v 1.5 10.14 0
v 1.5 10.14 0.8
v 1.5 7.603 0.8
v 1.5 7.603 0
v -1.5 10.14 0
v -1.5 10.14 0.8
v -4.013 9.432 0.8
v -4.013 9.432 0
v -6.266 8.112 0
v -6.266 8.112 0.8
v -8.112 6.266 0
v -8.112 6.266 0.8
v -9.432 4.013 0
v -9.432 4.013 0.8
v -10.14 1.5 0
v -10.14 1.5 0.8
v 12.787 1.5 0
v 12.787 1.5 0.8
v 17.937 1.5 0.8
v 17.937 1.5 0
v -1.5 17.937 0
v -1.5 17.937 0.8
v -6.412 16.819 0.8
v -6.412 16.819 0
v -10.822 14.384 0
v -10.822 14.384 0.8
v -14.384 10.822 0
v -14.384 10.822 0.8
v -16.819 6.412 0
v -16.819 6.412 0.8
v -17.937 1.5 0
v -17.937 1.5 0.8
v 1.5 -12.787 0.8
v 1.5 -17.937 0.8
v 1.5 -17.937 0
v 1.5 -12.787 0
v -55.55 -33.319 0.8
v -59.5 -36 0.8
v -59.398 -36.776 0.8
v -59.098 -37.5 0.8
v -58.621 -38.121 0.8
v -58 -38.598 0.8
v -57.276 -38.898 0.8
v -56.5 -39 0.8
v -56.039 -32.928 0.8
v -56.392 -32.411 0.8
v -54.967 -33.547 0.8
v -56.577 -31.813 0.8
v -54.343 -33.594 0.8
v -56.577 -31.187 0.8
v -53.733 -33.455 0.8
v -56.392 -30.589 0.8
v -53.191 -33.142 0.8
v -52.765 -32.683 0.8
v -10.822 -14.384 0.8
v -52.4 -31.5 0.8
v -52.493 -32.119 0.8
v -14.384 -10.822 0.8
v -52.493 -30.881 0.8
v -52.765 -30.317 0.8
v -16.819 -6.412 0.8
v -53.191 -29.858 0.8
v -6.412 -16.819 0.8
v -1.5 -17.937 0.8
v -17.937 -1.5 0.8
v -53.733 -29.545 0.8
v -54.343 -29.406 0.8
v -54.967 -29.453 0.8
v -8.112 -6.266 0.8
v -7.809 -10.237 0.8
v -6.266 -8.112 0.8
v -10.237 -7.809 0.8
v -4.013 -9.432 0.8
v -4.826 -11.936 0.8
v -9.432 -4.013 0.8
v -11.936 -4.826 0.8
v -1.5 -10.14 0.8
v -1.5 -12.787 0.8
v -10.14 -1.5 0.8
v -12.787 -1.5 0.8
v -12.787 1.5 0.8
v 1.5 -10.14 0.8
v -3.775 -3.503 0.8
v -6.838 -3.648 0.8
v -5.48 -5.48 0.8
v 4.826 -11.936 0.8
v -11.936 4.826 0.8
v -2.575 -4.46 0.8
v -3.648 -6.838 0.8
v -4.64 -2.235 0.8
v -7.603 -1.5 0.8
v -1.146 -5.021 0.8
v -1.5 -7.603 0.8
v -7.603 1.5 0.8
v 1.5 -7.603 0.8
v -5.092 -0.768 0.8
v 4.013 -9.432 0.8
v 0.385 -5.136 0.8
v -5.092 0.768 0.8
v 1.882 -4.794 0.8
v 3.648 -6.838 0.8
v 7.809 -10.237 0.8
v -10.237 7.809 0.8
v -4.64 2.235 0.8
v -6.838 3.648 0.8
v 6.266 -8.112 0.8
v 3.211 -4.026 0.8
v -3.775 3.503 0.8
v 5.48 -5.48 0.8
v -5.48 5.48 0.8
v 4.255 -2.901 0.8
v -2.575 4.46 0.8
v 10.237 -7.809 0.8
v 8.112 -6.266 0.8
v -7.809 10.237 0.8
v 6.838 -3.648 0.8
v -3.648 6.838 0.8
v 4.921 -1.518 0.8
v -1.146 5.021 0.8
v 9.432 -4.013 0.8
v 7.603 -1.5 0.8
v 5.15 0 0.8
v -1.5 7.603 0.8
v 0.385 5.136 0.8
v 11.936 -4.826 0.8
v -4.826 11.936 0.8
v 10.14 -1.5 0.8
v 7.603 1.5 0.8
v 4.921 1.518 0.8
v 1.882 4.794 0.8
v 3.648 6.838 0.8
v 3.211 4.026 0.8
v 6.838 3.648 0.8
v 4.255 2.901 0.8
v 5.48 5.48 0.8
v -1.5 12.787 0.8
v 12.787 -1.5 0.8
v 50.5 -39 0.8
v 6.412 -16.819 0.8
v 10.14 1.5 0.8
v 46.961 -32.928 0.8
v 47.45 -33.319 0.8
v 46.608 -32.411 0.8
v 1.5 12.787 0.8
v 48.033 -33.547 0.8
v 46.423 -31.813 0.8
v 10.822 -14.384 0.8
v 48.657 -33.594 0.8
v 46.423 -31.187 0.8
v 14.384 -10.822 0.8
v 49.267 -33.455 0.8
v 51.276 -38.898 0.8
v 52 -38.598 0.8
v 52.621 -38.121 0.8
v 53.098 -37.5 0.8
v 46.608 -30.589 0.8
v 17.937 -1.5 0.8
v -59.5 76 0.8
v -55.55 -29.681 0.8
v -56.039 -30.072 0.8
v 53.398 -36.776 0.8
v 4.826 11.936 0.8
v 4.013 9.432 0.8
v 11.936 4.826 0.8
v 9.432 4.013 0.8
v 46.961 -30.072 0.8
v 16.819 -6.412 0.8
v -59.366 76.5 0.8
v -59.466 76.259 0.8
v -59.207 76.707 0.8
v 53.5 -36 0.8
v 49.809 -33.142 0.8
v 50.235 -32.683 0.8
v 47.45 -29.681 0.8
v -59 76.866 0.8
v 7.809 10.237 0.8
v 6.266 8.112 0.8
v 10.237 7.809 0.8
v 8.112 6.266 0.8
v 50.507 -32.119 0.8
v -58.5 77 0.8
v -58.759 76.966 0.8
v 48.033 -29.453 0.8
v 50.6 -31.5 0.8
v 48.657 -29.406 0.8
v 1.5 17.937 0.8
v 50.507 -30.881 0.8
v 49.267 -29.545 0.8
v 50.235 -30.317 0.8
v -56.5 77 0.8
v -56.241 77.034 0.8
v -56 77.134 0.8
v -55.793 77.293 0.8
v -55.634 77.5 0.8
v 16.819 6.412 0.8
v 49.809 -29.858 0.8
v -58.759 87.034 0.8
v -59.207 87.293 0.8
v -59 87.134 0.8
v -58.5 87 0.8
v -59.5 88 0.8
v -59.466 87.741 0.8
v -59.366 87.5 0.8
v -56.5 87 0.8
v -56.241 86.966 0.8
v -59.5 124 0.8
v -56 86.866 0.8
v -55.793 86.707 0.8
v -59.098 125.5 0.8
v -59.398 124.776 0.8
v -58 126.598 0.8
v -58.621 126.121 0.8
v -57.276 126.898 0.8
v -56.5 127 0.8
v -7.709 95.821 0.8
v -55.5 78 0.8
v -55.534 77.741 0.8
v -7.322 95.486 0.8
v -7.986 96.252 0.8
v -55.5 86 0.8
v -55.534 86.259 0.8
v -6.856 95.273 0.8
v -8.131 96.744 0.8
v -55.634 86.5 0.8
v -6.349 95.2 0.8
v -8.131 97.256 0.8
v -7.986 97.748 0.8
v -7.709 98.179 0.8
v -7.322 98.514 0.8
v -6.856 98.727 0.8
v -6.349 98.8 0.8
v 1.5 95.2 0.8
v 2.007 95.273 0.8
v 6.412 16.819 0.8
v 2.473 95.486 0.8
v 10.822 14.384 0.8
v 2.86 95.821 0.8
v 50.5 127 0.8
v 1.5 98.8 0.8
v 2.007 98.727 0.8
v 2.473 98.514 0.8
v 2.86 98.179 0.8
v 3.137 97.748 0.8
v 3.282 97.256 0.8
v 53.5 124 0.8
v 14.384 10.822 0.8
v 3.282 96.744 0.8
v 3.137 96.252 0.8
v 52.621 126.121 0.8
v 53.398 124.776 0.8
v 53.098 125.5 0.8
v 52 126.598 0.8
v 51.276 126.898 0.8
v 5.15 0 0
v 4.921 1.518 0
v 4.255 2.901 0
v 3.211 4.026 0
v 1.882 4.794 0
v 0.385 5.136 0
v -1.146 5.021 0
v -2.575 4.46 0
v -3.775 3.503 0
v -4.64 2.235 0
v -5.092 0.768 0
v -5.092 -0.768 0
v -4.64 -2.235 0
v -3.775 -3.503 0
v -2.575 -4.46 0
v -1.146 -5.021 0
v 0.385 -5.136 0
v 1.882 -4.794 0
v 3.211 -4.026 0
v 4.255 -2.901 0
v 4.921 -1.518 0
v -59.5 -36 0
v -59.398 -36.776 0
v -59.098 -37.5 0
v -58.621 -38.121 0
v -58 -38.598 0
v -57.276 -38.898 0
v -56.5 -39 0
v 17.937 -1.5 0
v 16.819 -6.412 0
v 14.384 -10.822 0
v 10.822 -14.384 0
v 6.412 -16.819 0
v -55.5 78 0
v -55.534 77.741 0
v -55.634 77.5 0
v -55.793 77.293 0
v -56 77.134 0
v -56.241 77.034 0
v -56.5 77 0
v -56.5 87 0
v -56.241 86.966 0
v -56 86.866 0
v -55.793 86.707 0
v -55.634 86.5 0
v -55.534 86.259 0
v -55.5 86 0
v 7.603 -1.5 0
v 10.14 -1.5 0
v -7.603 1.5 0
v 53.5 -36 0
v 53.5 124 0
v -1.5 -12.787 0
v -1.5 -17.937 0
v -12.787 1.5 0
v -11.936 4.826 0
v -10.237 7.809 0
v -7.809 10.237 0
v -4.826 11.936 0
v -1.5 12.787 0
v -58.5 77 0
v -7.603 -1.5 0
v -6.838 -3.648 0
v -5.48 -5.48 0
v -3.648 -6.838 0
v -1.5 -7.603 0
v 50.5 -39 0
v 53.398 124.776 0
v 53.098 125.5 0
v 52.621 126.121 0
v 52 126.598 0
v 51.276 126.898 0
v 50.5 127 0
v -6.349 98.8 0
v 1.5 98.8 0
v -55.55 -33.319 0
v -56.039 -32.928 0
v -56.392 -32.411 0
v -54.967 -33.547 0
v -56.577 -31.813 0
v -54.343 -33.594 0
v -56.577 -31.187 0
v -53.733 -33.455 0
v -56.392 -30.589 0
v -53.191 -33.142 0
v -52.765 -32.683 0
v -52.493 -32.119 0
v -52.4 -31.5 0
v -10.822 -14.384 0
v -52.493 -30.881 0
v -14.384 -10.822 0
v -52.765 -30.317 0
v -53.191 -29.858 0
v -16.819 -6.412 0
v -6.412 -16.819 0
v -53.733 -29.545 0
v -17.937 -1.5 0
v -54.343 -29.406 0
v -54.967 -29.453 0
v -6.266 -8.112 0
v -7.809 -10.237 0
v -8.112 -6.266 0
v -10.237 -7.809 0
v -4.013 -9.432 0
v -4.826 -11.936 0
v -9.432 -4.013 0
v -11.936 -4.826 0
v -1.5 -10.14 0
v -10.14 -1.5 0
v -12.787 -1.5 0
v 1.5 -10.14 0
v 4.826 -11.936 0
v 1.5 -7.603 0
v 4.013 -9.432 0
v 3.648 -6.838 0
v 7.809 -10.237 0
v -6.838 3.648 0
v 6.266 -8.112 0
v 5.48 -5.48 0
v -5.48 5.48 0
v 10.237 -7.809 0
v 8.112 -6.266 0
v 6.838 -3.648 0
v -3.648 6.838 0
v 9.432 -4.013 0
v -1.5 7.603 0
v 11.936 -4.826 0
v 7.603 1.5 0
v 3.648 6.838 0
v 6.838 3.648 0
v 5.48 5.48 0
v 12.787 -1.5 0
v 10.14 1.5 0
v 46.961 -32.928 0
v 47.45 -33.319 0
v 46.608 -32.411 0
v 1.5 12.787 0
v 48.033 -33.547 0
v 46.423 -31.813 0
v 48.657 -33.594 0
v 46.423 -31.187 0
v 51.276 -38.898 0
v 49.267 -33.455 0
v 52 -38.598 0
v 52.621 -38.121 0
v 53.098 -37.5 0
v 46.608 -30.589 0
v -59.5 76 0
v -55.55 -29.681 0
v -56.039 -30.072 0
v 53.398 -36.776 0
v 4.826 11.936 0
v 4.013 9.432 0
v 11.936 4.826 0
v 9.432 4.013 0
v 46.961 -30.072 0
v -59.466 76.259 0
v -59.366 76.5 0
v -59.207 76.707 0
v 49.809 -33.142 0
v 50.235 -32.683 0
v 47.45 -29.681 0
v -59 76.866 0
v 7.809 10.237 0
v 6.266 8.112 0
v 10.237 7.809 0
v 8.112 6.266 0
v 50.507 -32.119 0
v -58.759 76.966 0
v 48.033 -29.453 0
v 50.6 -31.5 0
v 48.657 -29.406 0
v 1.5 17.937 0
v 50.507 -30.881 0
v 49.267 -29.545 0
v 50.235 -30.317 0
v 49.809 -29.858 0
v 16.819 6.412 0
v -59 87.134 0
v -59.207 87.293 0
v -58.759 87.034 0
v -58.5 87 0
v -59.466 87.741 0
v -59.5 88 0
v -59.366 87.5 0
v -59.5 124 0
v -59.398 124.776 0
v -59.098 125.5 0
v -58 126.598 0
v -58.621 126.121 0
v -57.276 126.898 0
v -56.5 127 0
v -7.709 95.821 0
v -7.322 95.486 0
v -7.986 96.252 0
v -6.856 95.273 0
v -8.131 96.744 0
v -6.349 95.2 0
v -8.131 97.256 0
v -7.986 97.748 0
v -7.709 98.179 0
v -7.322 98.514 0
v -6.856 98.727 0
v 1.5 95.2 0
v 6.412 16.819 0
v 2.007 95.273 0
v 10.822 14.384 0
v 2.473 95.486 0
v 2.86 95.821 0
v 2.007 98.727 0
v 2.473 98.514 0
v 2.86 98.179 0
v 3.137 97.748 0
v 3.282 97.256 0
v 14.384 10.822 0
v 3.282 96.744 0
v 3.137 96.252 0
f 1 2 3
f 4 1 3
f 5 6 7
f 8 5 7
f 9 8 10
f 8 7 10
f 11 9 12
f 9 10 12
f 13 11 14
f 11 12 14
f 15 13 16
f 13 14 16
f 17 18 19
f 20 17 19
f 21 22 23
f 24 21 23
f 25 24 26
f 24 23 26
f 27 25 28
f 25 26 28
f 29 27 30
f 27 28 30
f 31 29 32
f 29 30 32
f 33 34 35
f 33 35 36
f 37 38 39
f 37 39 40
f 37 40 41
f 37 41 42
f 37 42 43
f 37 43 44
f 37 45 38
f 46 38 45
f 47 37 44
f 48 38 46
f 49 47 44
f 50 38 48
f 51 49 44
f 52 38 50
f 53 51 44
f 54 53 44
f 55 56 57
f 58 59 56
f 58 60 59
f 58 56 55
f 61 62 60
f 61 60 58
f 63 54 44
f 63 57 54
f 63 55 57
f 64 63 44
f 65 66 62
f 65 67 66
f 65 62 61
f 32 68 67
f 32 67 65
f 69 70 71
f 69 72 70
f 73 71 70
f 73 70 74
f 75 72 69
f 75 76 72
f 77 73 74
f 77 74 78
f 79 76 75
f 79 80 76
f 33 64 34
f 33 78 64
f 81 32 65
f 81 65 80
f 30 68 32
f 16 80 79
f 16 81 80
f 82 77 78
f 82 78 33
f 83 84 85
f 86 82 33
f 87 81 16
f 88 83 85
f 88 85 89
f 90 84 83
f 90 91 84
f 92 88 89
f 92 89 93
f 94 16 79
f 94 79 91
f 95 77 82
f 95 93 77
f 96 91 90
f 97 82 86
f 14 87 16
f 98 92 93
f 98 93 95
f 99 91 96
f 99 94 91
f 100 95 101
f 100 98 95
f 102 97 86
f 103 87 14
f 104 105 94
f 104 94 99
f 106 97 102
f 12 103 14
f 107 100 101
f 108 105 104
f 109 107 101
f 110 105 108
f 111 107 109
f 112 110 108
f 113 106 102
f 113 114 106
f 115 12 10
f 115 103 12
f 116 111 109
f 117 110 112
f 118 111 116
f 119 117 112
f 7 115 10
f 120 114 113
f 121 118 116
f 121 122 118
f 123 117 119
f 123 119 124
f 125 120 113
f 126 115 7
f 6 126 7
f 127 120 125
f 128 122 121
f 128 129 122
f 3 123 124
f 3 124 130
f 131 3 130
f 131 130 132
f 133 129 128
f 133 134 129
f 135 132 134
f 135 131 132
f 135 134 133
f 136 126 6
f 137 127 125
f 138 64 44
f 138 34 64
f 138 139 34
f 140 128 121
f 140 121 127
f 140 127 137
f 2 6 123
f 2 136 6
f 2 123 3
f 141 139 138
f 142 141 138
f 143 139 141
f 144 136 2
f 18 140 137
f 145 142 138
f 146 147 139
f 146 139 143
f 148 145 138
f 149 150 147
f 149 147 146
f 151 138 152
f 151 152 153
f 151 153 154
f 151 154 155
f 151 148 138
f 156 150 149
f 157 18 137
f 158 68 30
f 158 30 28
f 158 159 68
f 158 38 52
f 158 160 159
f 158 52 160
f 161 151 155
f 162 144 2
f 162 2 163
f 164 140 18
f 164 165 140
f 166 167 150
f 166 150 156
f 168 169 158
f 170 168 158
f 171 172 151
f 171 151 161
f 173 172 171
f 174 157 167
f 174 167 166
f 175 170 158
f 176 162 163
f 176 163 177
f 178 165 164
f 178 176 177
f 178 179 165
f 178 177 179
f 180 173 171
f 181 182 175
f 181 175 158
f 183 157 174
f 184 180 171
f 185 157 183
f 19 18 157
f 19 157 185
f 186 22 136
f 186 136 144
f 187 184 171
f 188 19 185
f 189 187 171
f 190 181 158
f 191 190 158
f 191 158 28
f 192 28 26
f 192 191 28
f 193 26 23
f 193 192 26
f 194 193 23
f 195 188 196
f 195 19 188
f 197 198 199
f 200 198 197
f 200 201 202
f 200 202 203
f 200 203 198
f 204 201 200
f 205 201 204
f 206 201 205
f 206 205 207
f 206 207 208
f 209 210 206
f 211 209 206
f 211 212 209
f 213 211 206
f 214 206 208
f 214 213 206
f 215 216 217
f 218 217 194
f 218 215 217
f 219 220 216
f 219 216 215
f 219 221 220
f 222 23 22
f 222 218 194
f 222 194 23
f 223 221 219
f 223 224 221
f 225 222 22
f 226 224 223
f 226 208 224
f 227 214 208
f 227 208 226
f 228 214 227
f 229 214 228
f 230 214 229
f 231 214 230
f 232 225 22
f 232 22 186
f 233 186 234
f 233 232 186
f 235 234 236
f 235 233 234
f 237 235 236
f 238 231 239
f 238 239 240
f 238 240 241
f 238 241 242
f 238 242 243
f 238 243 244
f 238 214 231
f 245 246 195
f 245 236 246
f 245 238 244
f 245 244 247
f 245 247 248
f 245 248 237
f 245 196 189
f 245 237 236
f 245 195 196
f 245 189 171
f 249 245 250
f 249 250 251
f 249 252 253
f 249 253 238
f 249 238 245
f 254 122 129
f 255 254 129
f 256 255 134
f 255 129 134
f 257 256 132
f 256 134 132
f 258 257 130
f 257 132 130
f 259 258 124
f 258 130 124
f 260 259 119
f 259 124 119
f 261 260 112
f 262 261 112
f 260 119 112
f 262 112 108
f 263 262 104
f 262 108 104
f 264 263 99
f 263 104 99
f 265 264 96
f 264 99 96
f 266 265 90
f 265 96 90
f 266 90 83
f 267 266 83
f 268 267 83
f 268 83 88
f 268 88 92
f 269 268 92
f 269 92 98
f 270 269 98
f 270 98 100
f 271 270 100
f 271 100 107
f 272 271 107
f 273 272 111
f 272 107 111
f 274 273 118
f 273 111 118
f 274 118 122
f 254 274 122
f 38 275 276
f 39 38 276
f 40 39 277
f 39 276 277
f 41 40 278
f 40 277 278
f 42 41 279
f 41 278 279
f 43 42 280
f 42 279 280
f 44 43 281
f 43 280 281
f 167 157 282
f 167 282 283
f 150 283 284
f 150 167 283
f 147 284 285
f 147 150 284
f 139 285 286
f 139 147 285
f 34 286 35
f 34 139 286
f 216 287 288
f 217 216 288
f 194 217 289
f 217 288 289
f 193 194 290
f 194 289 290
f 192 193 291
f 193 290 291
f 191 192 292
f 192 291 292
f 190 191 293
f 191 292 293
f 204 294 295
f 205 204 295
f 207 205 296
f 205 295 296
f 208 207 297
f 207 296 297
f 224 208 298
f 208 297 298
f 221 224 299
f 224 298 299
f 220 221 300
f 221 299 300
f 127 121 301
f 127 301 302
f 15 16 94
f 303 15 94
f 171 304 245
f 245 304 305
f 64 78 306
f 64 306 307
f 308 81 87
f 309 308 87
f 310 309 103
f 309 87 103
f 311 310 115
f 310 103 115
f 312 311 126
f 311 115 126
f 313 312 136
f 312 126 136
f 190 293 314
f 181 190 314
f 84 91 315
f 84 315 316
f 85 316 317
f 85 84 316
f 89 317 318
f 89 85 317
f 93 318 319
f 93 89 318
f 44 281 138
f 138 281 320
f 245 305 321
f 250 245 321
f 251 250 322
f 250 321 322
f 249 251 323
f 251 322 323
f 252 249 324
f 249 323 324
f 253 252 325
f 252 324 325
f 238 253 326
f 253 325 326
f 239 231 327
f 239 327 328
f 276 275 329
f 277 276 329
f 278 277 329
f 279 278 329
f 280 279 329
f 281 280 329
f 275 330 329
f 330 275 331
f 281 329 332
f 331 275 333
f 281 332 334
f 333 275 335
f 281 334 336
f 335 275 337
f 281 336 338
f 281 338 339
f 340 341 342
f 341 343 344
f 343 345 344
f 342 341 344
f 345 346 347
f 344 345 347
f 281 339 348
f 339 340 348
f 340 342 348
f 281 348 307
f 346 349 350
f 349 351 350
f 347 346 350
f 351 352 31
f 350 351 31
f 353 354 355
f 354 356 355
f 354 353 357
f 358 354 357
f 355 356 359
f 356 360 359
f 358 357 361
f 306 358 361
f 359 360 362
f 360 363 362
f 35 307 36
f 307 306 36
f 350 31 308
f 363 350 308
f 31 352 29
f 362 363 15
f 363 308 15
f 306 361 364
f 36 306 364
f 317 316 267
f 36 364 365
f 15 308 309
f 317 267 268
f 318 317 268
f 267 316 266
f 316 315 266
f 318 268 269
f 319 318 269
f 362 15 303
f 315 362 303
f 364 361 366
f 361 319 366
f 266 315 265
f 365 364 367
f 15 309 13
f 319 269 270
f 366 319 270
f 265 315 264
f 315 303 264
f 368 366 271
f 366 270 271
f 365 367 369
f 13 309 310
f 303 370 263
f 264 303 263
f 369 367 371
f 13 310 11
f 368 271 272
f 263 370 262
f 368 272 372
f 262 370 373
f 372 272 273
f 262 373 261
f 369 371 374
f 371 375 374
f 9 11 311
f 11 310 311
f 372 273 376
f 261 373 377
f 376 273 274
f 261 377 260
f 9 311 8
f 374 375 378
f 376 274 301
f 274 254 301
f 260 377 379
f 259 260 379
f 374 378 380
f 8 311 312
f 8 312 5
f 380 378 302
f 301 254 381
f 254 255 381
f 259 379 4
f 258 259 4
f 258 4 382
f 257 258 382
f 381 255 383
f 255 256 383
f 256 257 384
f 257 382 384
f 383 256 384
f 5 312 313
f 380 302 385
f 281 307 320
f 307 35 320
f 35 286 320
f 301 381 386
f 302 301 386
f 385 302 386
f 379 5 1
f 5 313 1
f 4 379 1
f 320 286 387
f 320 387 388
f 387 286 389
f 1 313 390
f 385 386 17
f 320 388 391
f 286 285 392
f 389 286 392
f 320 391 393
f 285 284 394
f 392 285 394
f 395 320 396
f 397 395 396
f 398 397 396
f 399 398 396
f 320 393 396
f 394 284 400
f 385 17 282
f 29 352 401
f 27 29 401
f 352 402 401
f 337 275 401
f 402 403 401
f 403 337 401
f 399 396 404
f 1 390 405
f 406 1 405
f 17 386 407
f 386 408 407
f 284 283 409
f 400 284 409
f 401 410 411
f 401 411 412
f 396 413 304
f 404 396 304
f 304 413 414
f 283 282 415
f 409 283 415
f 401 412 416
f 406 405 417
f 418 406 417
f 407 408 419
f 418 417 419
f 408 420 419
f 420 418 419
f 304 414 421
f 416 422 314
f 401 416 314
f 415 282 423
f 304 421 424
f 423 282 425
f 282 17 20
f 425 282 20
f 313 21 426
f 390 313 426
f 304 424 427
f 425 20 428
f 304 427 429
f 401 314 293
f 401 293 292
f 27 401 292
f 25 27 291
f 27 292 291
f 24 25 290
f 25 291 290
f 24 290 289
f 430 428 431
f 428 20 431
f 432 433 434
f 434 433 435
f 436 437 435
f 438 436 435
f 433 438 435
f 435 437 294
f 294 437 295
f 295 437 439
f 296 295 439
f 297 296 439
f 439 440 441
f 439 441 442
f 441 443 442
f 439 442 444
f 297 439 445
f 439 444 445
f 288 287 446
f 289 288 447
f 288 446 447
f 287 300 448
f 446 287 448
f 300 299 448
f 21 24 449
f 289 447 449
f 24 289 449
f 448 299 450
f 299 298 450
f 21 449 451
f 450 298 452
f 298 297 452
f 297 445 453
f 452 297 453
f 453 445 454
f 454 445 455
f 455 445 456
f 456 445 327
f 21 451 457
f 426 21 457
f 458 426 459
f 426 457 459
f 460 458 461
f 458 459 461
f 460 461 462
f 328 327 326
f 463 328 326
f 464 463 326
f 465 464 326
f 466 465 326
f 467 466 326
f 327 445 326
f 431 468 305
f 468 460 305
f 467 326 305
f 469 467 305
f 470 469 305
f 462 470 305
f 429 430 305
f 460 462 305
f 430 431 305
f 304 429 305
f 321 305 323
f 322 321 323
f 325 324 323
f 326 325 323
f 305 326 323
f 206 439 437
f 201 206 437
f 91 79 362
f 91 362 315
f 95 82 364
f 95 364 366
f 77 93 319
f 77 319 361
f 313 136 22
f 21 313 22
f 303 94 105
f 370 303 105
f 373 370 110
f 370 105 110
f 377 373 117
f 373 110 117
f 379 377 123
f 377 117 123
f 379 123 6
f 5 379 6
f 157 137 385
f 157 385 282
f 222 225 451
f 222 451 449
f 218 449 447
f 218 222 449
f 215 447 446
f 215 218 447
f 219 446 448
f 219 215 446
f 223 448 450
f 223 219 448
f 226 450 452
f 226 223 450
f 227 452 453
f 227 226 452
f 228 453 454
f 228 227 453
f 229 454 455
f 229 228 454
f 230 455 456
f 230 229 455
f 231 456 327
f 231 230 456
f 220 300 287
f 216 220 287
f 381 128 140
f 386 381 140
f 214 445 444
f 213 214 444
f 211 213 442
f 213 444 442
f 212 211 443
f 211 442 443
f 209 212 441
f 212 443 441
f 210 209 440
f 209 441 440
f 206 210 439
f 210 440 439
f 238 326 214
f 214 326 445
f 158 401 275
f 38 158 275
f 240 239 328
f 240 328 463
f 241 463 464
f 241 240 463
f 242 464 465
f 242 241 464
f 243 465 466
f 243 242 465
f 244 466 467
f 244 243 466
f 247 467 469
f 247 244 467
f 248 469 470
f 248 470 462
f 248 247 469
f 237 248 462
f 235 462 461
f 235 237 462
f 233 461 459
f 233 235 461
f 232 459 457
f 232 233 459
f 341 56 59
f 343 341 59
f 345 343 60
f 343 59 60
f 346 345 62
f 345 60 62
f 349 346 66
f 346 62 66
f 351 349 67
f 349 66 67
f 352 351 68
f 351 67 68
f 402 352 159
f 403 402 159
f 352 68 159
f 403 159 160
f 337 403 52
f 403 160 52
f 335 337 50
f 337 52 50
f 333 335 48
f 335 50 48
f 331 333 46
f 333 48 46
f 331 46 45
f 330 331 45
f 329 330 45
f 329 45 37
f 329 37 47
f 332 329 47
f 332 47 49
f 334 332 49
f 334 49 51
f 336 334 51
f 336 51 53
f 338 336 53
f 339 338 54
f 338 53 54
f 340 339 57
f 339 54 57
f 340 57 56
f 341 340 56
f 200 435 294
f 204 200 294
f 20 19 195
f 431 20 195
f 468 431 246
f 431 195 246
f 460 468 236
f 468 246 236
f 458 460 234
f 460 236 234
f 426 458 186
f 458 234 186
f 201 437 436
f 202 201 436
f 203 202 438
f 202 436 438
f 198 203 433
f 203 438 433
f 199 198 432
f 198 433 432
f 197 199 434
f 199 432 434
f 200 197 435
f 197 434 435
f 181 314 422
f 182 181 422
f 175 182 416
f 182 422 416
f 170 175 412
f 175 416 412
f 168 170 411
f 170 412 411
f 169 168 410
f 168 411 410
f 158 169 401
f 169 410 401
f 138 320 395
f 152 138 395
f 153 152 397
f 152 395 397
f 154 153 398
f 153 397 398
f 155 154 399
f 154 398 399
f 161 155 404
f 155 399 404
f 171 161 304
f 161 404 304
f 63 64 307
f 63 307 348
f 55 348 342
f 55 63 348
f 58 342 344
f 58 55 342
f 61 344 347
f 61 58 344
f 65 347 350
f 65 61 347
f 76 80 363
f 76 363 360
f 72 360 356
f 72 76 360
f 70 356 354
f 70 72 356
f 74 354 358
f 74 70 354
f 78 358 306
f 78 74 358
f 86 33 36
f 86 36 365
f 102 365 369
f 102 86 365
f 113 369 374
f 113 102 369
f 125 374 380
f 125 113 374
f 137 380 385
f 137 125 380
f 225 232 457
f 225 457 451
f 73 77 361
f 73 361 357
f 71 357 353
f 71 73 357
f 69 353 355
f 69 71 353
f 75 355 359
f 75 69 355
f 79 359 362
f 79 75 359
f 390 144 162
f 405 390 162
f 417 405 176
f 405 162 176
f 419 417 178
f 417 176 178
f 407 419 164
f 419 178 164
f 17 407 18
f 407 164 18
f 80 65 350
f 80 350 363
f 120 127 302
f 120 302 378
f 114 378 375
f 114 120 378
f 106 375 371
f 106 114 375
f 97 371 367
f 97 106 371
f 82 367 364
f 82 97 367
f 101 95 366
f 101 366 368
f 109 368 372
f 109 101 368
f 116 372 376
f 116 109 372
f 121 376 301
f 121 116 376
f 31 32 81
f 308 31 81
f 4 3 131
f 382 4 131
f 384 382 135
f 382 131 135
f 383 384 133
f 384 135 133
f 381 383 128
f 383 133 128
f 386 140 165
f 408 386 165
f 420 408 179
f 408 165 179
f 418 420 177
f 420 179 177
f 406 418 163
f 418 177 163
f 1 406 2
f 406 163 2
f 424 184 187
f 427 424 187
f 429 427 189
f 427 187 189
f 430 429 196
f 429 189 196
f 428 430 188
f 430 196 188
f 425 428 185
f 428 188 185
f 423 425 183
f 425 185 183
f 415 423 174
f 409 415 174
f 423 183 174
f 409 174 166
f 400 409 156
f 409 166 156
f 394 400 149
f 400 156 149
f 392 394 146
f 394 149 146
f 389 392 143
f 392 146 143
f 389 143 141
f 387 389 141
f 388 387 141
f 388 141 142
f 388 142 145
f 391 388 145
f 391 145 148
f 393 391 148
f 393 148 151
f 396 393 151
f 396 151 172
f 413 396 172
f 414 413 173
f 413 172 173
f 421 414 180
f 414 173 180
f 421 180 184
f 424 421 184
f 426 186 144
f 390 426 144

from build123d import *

# Parameters (mm, degrees)
SALIENTE_EXTRUIR1_DEPTH = 0.8
CROQUIS5_R              = 5.15
CORTAR_EXTRUIR1_DEPTH   = 0.8
CROQUIS4_R              = 2.1
CORTAR_EXTRUIR2_DEPTH   = 0.8


with BuildPart() as part:
    # Croquis1 → Saliente-Extruir1 (new body)
    with BuildSketch(Plane.XY):
        with BuildLine():
            Line((-55.5, 86), (-55.5, 78))
            ThreePointArc((-55.5, 78), (-55.792893219, 77.292893219), (-56.5, 77))
            Line((-56.5, 77), (-58.5, 77))
            ThreePointArc((-58.5, 77), (-59.207106781, 76.707106781), (-59.5, 76))
            Line((-59.5, 76), (-59.5, -36))
            ThreePointArc((-59.5, -36), (-58.621320344, -38.121320344), (-56.5, -39))
            Line((-56.5, -39), (50.5, -39))
            ThreePointArc((50.5, -39), (52.621320344, -38.121320344), (53.5, -36))
            Line((53.5, -36), (53.5, 124))
            ThreePointArc((53.5, 124), (52.621320344, 126.121320344), (50.5, 127))
            Line((50.5, 127), (-56.5, 127))
            ThreePointArc((-56.5, 127), (-58.621320344, 126.121320344), (-59.5, 124))
            Line((-59.5, 124), (-59.5, 88))
            ThreePointArc((-59.5, 88), (-59.207106781, 87.292893219), (-58.5, 87))
            Line((-58.5, 87), (-56.5, 87))
            ThreePointArc((-56.5, 87), (-55.792893219, 86.707106781), (-55.5, 86))
        make_face()
    extrude(amount=SALIENTE_EXTRUIR1_DEPTH)

    # Croquis5 → Cortar-Extruir1 (cut)
    with BuildSketch(Plane.XY.offset(0.8)):
        Circle(CROQUIS5_R)
        with BuildLine():
            Line((-17.937391115, -1.5), (-12.787322824, -1.5))
            ThreePointArc((-12.787322824, -1.5), (-9.103999808, -9.103999808), (-1.5, -12.787322824))
            Line((-1.5, -12.787322824), (-1.5, -17.937391115))
            ThreePointArc((-1.5, -17.937391115), (-12.727922061, -12.727922061), (-17.937391115, -1.5))
        make_face()
        with BuildLine():
            Line((-17.937391115, 1.5), (-12.787322824, 1.5))
            ThreePointArc((-12.787322824, 1.5), (-9.103999808, 9.103999808), (-1.5, 12.787322824))
            Line((-1.5, 12.787322824), (-1.5, 17.937391115))
            ThreePointArc((-1.5, 17.937391115), (-12.727922061, 12.727922061), (-17.937391115, 1.5))
        make_face()
        with BuildLine():
            Line((1.5, -17.937391115), (1.5, -12.787322824))
            ThreePointArc((1.5, -12.787322824), (9.103999808, -9.103999808), (12.787322824, -1.5))
            Line((12.787322824, -1.5), (17.937391115, -1.5))
            ThreePointArc((17.937391115, -1.5), (12.727922061, -12.727922061), (1.5, -17.937391115))
        make_face()
        with BuildLine():
            Line((-10.139649895, 1.5), (-7.603453163, 1.5))
            ThreePointArc((-7.603453163, 1.5), (-5.480077554, 5.480077554), (-1.5, 7.603453163))
            Line((-1.5, 7.603453163), (-1.5, 10.139649895))
            ThreePointArc((-1.5, 10.139649895), (-7.247844507, 7.247844507), (-10.139649895, 1.5))
        make_face()
        with BuildLine():
            Line((-10.139649895, -1.5), (-7.603453163, -1.5))
            ThreePointArc((-7.603453163, -1.5), (-5.480077554, -5.480077554), (-1.5, -7.603453163))
            Line((-1.5, -7.603453163), (-1.5, -10.139649895))
            ThreePointArc((-1.5, -10.139649895), (-7.247844507, -7.247844507), (-10.139649895, -1.5))
        make_face()
        with BuildLine():
            Line((7.603453163, -1.5), (10.139649895, -1.5))
            ThreePointArc((10.139649895, -1.5), (7.247844507, -7.247844507), (1.5, -10.139649895))
            Line((1.5, -10.139649895), (1.5, -7.603453163))
            ThreePointArc((1.5, -7.603453163), (5.480077554, -5.480077554), (7.603453163, -1.5))
        make_face()
        with BuildLine():
            Line((7.603453163, 1.5), (10.139649895, 1.5))
            ThreePointArc((10.139649895, 1.5), (7.247844507, 7.247844507), (1.5, 10.139649895))
            Line((1.5, 10.139649895), (1.5, 7.603453163))
            ThreePointArc((1.5, 7.603453163), (5.480077554, 5.480077554), (7.603453163, 1.5))
        make_face()
        with BuildLine():
            Line((12.787322824, 1.5), (17.937391115, 1.5))
            ThreePointArc((17.937391115, 1.5), (12.727922061, 12.727922061), (1.5, 17.937391115))
            Line((1.5, 17.937391115), (1.5, 12.787322824))
            ThreePointArc((1.5, 12.787322824), (9.103999808, 9.103999808), (12.787322824, 1.5))
        make_face()
    extrude(amount=-CORTAR_EXTRUIR1_DEPTH, mode=Mode.SUBTRACT)

    # Croquis4 → Cortar-Extruir2 (cut)
    with BuildSketch(Plane.XY.offset(0.8)):
        with Locations((-54.5, -31.5)):
            Circle(CROQUIS4_R)
        with Locations((48.5, -31.5)):
            Circle(CROQUIS4_R)
        with BuildLine():
            Line((-6.348885271, 98.8), (1.5, 98.8))
            ThreePointArc((1.5, 98.8), (3.3, 97), (1.5, 95.2))
            Line((1.5, 95.2), (-6.348885271, 95.2))
            ThreePointArc((-6.348885271, 95.2), (-8.148885271, 97), (-6.348885271, 98.8))
        make_face()
    extrude(amount=-CORTAR_EXTRUIR2_DEPTH, mode=Mode.SUBTRACT)


solid = part.part
